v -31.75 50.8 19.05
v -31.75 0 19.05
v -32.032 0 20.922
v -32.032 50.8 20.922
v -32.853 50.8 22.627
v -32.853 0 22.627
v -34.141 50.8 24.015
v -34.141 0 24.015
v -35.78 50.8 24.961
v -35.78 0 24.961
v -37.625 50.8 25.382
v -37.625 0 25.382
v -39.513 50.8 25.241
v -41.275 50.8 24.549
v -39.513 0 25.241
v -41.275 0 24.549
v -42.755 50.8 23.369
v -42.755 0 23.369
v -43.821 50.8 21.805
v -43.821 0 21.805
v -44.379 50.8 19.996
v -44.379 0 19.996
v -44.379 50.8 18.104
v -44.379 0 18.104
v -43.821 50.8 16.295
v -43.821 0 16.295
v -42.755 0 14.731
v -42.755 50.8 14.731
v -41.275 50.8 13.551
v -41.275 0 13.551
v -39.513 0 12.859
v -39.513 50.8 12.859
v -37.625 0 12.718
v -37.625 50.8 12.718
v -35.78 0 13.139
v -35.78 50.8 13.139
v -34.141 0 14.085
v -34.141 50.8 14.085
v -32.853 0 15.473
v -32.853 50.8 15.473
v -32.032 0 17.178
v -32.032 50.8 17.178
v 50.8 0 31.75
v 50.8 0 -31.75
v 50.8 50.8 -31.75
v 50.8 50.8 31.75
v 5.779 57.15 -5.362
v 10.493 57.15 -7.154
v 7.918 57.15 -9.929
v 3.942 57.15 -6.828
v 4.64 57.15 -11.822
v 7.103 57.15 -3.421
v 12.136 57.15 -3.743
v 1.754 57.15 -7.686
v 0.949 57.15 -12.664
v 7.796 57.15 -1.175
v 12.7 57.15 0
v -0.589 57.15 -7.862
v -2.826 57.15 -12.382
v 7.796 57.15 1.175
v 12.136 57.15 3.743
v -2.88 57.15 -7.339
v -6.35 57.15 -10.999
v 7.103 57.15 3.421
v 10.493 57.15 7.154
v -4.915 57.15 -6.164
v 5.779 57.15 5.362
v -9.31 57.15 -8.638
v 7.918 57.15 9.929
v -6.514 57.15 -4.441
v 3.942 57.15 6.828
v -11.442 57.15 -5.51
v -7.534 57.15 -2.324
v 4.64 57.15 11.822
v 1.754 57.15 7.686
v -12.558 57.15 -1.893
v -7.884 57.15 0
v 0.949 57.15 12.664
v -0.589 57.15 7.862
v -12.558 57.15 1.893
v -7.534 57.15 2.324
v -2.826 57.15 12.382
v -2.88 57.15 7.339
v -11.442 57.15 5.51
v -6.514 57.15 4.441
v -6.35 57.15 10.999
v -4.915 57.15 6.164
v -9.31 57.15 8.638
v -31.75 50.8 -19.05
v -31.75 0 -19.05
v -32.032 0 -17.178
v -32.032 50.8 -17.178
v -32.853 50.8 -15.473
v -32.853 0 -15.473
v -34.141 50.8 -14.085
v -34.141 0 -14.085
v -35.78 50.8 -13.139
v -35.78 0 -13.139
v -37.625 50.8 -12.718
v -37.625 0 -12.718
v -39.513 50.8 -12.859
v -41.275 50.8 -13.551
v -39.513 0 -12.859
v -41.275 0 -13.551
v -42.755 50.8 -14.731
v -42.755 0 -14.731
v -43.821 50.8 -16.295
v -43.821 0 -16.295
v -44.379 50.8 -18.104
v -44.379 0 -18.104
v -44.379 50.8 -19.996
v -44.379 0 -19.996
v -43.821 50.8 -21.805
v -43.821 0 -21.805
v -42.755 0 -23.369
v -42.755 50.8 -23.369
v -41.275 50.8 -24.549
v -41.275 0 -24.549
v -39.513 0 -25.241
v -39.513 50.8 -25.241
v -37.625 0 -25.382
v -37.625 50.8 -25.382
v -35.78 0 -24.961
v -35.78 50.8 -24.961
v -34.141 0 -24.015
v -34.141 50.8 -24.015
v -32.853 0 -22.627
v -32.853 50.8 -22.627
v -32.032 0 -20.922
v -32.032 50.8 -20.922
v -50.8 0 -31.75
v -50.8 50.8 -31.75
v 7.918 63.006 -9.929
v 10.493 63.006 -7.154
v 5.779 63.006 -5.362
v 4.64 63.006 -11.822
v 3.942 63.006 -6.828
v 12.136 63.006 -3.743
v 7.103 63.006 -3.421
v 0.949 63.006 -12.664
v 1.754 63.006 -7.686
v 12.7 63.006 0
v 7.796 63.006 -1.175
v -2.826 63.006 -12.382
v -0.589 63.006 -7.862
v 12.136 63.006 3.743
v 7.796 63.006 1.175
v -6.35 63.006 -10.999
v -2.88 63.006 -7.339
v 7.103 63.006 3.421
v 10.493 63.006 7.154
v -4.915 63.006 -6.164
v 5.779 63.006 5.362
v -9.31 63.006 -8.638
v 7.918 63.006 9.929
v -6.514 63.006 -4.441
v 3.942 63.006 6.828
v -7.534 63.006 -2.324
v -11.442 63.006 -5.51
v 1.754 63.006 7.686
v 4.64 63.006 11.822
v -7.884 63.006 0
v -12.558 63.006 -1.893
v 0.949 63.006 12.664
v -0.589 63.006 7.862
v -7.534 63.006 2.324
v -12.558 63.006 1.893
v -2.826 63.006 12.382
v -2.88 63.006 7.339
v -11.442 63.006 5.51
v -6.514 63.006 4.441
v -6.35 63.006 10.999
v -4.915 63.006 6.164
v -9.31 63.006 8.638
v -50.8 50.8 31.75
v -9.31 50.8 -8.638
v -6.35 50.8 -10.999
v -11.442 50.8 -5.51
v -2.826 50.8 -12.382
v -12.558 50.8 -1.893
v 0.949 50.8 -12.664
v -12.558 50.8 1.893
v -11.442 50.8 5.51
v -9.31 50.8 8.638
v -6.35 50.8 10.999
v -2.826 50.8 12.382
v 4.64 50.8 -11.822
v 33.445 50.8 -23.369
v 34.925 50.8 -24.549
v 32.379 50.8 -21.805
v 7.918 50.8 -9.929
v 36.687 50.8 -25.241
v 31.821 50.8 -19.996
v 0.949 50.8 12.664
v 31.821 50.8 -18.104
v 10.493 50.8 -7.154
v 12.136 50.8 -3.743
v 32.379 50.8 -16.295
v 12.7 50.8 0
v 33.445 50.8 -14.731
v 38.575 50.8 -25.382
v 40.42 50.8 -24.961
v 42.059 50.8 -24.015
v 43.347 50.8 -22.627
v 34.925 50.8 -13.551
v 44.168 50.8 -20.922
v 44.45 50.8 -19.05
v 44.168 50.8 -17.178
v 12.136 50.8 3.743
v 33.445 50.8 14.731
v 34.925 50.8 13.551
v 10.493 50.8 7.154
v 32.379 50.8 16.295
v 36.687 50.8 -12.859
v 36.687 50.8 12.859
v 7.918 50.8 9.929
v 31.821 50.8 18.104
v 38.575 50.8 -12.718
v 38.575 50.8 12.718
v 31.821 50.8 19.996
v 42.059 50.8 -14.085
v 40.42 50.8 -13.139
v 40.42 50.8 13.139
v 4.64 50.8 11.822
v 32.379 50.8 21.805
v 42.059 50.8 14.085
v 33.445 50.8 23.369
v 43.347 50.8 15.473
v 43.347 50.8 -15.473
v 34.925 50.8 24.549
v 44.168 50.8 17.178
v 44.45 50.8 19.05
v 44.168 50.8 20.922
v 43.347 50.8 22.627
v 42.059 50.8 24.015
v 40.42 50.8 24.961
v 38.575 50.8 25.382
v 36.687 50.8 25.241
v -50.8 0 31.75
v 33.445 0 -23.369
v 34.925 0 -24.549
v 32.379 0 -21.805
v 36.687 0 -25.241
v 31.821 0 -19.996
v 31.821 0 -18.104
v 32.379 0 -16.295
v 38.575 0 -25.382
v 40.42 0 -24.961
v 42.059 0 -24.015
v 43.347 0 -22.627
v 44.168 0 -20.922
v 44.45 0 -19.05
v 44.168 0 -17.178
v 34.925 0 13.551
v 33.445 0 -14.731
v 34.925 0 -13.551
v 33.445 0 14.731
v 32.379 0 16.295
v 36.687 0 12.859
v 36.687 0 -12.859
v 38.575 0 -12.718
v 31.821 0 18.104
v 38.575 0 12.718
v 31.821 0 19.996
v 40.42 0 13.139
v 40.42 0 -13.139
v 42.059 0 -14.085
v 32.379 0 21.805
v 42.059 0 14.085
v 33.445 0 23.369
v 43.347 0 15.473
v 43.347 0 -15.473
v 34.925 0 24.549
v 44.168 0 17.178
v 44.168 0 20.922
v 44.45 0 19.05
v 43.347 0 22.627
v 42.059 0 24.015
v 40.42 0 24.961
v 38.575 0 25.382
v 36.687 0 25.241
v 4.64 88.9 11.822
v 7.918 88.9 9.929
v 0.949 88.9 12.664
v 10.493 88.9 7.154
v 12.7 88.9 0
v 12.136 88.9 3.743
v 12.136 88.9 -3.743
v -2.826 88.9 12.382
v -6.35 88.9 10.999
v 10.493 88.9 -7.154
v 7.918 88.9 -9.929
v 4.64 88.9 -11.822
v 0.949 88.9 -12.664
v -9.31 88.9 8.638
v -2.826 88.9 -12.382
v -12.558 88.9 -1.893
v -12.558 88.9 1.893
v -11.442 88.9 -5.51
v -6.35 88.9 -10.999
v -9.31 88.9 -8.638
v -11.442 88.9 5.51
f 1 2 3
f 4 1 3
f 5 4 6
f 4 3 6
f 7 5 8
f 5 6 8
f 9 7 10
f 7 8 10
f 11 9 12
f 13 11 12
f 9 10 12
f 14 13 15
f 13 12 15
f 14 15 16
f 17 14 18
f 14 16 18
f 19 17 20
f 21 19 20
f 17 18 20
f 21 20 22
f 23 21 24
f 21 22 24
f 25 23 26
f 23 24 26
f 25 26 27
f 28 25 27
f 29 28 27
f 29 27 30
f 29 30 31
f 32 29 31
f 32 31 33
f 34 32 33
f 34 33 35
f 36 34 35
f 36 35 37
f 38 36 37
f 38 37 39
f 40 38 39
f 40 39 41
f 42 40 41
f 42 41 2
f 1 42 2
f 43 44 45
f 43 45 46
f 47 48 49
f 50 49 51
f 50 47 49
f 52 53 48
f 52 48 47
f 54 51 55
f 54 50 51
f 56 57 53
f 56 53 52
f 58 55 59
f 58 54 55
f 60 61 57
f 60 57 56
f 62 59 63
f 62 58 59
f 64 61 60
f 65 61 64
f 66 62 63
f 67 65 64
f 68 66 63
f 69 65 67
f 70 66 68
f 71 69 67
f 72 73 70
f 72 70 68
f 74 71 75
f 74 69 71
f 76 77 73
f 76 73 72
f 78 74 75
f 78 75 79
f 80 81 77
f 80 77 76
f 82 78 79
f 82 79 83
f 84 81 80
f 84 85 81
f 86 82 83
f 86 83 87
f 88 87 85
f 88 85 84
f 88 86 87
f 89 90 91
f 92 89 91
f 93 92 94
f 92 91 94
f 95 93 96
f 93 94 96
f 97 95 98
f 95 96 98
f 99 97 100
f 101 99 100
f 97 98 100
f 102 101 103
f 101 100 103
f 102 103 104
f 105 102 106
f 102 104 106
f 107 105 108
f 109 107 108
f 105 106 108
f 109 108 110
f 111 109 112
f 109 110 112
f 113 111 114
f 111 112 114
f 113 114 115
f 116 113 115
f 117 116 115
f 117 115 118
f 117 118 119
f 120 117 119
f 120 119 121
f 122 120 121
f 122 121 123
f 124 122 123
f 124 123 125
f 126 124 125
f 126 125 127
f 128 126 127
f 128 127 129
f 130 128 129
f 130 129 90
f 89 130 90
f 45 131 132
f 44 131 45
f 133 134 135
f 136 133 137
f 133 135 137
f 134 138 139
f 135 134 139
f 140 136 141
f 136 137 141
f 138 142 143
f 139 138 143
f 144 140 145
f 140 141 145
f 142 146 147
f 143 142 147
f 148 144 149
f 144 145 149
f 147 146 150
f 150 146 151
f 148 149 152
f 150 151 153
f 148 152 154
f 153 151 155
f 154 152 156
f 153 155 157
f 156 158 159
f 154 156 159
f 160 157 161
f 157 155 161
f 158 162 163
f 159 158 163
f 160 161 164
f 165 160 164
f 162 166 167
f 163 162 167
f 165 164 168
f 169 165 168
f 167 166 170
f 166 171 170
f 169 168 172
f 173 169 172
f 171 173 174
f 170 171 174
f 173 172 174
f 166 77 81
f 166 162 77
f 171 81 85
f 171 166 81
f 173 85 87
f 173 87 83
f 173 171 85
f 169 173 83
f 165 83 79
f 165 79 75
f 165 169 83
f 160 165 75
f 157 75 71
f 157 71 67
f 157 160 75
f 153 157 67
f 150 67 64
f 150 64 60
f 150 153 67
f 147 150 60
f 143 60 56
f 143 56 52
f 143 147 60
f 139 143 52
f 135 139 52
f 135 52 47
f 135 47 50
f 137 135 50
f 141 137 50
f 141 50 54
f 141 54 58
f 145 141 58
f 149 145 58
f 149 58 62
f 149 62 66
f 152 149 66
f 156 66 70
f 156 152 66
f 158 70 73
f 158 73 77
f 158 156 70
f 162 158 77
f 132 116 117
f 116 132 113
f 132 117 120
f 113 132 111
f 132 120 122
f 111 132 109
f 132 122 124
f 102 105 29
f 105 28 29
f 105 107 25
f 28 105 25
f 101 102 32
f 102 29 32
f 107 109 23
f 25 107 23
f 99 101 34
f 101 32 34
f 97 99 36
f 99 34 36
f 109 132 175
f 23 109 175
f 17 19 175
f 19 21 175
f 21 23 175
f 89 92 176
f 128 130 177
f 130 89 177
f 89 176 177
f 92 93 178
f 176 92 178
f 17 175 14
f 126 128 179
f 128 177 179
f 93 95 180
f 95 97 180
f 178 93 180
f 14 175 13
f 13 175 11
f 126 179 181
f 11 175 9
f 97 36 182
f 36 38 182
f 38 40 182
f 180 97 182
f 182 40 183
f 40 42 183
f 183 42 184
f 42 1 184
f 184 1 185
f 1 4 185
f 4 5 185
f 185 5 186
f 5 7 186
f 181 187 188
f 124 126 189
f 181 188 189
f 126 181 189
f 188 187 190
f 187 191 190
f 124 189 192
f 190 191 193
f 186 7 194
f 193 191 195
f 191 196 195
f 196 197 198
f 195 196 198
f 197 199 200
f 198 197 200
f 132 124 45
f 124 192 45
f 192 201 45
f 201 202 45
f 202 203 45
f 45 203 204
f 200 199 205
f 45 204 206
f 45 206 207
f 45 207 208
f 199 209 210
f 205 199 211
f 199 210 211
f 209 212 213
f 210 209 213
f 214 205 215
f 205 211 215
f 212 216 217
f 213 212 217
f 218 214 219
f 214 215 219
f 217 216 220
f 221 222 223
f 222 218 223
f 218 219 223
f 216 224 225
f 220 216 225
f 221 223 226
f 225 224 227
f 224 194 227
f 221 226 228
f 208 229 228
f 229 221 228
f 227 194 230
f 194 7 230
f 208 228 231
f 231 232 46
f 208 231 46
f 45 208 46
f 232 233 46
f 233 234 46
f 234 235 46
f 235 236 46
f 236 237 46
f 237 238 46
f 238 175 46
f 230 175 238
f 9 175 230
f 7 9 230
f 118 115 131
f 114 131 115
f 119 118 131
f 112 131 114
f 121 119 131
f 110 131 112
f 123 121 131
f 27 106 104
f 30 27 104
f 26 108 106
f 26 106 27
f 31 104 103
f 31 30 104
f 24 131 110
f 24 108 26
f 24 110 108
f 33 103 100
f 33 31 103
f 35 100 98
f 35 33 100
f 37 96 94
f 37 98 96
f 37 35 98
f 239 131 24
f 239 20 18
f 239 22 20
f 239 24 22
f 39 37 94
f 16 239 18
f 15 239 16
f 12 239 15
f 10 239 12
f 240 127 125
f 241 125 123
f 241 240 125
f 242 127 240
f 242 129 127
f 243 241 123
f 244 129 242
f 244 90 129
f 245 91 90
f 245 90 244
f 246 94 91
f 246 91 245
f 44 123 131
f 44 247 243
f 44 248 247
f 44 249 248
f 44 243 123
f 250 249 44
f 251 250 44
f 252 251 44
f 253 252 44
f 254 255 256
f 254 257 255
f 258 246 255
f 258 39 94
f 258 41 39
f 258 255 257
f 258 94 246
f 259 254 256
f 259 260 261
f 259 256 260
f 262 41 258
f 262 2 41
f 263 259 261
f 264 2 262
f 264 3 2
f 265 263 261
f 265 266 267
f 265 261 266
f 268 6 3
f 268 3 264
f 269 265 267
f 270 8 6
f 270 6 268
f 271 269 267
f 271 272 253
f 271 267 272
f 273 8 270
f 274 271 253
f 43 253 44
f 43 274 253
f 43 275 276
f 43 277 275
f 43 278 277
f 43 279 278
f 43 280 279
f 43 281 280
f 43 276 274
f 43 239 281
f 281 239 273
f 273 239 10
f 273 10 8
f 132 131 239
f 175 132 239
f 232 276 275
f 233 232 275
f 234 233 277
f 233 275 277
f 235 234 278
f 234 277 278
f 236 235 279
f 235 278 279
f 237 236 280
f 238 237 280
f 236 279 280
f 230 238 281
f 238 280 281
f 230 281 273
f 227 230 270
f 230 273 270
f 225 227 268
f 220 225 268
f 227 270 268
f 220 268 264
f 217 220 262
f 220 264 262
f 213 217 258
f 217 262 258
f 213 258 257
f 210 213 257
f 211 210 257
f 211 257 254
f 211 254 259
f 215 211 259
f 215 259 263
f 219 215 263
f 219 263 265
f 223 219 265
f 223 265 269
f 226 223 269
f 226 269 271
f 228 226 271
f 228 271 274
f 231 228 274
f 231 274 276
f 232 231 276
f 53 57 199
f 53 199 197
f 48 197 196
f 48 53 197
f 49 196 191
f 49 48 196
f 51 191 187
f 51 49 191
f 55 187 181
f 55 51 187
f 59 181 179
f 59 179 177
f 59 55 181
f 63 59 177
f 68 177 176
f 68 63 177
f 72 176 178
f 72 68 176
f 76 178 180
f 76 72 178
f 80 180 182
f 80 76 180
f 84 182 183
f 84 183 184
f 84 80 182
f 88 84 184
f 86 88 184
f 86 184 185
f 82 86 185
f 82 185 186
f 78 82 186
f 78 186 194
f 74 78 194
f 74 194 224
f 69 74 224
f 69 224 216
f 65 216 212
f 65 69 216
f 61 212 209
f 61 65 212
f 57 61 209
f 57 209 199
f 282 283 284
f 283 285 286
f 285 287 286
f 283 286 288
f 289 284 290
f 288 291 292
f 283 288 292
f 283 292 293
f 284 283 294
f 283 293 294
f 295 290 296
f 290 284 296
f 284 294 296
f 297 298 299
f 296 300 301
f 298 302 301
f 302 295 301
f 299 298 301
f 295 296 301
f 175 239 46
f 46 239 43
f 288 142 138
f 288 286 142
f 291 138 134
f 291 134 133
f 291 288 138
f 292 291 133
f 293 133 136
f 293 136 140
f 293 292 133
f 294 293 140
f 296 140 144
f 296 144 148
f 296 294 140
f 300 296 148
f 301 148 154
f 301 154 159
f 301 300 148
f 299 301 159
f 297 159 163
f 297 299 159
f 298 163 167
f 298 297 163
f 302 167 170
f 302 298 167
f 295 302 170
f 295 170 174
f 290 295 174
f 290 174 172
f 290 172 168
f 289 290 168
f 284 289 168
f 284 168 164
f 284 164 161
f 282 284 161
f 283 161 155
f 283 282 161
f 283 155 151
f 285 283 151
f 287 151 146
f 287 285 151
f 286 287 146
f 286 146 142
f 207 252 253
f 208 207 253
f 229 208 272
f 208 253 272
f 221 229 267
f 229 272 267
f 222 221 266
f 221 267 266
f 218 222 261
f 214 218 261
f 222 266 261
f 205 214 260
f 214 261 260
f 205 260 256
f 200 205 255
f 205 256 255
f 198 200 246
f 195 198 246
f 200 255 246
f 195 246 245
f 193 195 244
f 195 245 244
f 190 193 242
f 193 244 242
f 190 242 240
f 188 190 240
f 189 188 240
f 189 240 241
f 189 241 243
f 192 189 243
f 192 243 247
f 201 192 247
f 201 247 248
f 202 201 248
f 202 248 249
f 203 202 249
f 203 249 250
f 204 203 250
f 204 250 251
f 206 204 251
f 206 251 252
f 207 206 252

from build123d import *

# Parameters (mm, degrees)
F0_W     = 101.6
F0_H     = 63.5
F1_DEPTH = 50.8
F2_R     = 6.35
F3_DEPTH = 50.801
F4_W     = 12.7
F4_H     = 38.1
F6_W     = 12.7
F6_H     = 5.855737


with BuildPart() as f1:
    # F0 (on Front) → F1 (new body)
    with BuildSketch(Plane.XZ):
        Rectangle(F0_W, F0_H)
    extrude(amount=-F1_DEPTH)

    # F2 (on face) → F3 (cut, through all)
    with BuildSketch(Plane.XZ):
        with Locations((38.1, -19.05)):
            Circle(F2_R)
        with Locations((38.1, 19.05)):
            Circle(F2_R)
        with Locations((-38.1, 19.05)):
            Circle(F2_R)
        with Locations((-38.1, -19.05)):
            Circle(F2_R)
    extrude(amount=-F3_DEPTH, mode=Mode.SUBTRACT)

    # F4 (on Top) → F5 (revolve)
    with BuildSketch(Plane.XY):
        with Locations((6.35, 69.85)):
            Rectangle(F4_W, F4_H)
    revolve(axis=Axis((0, 69.85, 0), (0, 1, 0)))

    # F6 (on Top) → F7 (revolve, cut)
    with BuildSketch(Plane.XY):
        with Locations((-14.233844, 60.077868)):
            Rectangle(F6_W, F6_H)
    revolve(axis=Axis((0, 88.9, 0), (0, 1, 0)), mode=Mode.SUBTRACT)


solid = f1.part
